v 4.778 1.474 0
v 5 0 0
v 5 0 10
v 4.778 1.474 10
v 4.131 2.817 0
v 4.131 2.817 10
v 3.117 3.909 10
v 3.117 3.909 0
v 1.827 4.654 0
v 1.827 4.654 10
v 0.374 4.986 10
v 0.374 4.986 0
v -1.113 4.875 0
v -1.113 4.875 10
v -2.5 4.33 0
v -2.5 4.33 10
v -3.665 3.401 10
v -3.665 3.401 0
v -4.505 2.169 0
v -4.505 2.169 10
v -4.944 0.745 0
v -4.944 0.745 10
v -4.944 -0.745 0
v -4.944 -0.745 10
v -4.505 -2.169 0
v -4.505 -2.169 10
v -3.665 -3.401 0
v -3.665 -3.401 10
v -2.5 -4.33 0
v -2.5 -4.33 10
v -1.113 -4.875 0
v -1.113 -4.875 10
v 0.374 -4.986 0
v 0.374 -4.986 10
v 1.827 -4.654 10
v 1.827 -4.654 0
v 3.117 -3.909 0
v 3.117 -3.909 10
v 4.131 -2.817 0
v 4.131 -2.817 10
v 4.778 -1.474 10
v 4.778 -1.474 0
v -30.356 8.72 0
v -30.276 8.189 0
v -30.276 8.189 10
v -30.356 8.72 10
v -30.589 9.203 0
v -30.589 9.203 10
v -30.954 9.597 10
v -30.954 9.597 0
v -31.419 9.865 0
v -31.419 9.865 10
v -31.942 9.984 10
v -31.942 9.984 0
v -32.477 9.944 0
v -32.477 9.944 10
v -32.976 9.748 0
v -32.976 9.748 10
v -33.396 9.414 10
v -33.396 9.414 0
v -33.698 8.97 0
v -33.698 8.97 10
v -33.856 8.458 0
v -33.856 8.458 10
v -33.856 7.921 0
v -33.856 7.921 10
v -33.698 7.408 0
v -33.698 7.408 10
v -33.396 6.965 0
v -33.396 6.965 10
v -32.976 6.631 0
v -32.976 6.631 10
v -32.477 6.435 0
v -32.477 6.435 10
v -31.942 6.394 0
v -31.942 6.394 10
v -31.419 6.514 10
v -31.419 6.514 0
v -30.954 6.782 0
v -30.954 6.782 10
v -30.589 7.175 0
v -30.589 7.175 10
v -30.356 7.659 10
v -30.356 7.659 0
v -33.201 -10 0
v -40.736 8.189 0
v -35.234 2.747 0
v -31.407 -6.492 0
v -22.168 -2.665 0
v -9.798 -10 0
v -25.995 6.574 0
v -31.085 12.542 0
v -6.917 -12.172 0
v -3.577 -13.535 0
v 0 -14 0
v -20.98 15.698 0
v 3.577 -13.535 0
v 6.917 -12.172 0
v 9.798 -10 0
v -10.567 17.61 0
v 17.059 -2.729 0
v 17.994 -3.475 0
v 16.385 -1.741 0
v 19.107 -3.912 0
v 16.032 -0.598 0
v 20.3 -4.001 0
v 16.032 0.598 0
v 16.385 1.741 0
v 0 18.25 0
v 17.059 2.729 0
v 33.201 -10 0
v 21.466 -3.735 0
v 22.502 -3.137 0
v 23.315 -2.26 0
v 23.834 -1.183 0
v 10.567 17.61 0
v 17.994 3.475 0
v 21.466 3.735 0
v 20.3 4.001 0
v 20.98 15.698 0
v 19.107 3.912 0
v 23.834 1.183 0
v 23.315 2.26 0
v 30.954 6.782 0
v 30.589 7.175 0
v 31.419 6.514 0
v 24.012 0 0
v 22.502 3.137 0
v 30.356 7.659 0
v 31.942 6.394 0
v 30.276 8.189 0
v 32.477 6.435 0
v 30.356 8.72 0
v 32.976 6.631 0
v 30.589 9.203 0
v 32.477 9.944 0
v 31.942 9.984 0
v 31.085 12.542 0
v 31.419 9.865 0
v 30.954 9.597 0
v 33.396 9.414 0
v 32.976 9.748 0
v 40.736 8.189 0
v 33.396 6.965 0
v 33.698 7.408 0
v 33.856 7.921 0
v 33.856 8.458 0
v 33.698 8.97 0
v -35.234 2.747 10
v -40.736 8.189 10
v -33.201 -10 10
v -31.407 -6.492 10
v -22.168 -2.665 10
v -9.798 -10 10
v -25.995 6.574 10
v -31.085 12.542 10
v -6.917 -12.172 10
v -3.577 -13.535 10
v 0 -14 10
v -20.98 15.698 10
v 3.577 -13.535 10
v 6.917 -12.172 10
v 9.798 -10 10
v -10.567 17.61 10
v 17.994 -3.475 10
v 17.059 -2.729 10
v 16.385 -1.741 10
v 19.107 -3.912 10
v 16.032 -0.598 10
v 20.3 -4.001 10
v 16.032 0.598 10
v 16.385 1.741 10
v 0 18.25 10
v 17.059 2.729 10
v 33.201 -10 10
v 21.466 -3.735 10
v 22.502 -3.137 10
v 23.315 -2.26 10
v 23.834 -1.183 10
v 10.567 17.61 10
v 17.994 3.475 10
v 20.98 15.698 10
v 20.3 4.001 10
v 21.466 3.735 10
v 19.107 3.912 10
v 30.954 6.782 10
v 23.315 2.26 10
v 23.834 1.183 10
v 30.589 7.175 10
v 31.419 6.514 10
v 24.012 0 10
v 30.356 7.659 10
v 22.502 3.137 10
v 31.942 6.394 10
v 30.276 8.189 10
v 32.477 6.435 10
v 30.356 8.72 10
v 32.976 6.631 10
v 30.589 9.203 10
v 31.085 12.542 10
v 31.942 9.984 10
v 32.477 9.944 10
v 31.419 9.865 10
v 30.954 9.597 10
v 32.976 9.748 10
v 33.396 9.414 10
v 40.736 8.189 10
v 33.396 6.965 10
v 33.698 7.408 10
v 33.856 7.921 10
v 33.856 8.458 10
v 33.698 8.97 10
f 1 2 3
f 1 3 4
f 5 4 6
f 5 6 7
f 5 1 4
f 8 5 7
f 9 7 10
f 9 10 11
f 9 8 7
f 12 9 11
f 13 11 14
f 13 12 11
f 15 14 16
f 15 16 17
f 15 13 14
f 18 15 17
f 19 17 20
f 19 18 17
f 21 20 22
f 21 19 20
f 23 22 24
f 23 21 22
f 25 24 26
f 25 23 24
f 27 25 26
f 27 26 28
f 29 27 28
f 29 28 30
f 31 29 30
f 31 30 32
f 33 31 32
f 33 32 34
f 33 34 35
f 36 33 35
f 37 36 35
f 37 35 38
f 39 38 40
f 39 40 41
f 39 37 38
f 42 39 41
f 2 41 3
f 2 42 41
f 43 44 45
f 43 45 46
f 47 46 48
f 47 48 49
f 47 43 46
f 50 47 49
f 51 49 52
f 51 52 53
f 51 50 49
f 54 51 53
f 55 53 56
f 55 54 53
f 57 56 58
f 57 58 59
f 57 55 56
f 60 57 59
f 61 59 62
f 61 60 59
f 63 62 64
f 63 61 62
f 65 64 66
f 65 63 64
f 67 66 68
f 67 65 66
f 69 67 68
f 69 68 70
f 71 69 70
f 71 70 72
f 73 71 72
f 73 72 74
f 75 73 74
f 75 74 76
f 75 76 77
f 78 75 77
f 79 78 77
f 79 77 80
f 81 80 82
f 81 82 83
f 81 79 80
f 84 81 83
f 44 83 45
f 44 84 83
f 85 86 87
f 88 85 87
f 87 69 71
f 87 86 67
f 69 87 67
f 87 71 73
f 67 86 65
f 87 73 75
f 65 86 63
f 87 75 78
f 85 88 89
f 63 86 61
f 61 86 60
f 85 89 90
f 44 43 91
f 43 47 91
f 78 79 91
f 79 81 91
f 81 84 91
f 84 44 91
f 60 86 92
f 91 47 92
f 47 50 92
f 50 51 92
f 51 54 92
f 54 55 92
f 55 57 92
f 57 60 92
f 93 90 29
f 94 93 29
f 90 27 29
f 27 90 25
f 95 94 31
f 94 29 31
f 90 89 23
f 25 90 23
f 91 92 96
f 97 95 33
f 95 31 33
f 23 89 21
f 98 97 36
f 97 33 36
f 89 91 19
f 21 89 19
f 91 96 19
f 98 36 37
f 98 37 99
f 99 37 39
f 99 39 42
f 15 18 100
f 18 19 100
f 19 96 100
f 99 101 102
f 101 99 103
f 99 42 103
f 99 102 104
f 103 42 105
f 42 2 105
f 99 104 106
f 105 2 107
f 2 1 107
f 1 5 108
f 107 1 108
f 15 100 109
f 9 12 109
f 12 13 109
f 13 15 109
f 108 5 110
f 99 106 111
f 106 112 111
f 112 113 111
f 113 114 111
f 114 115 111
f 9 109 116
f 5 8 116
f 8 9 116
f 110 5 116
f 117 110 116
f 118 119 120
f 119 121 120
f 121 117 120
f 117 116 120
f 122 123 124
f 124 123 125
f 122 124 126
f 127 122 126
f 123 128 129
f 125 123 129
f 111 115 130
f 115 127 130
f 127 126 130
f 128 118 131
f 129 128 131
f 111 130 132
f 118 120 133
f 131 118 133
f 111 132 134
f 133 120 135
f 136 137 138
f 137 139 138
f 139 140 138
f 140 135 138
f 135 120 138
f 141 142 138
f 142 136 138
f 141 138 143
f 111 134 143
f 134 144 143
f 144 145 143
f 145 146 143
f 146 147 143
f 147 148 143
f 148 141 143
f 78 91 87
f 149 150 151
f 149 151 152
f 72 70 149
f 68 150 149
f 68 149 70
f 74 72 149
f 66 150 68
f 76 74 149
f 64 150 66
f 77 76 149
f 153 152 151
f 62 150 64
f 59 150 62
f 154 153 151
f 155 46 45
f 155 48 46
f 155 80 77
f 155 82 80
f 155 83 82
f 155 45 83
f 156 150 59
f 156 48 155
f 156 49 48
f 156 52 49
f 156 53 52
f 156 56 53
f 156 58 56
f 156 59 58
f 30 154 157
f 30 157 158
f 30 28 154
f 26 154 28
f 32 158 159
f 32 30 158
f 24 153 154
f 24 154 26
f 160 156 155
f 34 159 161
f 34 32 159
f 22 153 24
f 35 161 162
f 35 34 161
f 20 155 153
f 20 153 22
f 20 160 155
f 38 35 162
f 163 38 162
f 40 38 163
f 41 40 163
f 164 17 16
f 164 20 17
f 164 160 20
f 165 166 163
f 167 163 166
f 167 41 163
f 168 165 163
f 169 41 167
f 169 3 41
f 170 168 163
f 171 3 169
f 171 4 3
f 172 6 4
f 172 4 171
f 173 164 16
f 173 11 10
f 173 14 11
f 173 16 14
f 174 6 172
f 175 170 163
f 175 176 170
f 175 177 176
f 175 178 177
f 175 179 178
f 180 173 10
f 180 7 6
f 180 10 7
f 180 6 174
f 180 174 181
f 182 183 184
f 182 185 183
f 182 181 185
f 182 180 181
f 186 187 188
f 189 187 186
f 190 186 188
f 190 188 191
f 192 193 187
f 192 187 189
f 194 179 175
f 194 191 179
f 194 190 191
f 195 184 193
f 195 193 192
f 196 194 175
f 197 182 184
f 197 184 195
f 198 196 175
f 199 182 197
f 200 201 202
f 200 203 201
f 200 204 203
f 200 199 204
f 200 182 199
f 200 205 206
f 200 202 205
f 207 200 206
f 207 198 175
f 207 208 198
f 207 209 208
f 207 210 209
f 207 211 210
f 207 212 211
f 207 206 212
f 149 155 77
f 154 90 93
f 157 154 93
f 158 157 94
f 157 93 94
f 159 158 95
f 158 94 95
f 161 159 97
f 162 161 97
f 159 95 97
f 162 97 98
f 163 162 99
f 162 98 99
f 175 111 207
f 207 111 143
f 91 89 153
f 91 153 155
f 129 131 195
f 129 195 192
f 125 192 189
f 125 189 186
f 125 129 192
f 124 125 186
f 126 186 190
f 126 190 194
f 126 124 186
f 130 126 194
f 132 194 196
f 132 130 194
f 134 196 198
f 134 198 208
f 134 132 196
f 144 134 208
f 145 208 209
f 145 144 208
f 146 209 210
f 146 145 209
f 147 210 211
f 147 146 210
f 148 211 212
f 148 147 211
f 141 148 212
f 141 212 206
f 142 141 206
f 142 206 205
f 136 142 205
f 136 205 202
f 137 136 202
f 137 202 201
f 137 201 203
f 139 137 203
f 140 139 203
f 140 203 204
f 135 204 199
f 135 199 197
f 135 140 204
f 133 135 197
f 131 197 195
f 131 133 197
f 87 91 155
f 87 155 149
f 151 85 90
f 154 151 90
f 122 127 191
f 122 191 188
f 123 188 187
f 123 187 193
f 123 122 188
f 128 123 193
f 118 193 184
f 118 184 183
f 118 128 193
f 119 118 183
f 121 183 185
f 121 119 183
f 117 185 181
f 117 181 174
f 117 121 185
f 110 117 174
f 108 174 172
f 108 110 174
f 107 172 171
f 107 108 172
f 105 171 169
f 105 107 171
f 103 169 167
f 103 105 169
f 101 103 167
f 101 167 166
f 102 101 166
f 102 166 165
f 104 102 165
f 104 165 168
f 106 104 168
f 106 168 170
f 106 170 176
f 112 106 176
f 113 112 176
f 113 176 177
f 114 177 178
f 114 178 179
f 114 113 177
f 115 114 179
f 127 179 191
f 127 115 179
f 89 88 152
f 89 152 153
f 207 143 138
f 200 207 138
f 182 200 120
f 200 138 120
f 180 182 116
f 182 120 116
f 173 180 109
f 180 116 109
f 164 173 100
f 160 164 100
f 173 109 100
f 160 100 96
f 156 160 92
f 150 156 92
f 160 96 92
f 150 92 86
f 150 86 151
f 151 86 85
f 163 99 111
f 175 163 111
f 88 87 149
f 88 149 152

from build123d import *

# Parameters (mm, degrees)
SKETCH1_R           = 4.0125
SKETCH1_R_2         = 5
SKETCH1_R_3         = 1.8
BOSS_EXTRUDE1_DEPTH = 10


with BuildPart() as part:
    # Sketch1 → Boss-Extrude1 (new body)
    with BuildSketch(Plane.XY):
        with BuildLine():
            Line((-40.735590092, 8.189406634), (-33.201291173, -10))
            Line((-33.201291173, -10), (-9.797958971, -10))
            ThreePointArc((-9.797958971, -10), (0, -14), (9.797958971, -10))
            Line((9.797958971, -10), (33.201291173, -10))
            Line((33.201291173, -10), (40.735590092, 8.189406634))
            ThreePointArc((40.735590092, 8.189406634), (0, 18.25), (-40.735590092, 8.189406634))
        make_face()
        with Locations((20, 0)):
            Circle(SKETCH1_R, mode=Mode.SUBTRACT)
        Circle(SKETCH1_R_2, mode=Mode.SUBTRACT)
        with Locations((-32.07645249, 8.189406634)):
            Circle(SKETCH1_R_3, mode=Mode.SUBTRACT)
        with Locations(Location((32.07645249, 8.189406634, 0), (0, 0, 180))):
            Circle(SKETCH1_R_3, mode=Mode.SUBTRACT)
        Polygon((-25.995276927, 6.573779763), (-35.234072252, 2.746945439), (-31.407237928, -6.491849886), (-22.168442603, -2.665015562), align=None, mode=Mode.SUBTRACT)
    extrude(amount=BOSS_EXTRUDE1_DEPTH)


solid = part.part
